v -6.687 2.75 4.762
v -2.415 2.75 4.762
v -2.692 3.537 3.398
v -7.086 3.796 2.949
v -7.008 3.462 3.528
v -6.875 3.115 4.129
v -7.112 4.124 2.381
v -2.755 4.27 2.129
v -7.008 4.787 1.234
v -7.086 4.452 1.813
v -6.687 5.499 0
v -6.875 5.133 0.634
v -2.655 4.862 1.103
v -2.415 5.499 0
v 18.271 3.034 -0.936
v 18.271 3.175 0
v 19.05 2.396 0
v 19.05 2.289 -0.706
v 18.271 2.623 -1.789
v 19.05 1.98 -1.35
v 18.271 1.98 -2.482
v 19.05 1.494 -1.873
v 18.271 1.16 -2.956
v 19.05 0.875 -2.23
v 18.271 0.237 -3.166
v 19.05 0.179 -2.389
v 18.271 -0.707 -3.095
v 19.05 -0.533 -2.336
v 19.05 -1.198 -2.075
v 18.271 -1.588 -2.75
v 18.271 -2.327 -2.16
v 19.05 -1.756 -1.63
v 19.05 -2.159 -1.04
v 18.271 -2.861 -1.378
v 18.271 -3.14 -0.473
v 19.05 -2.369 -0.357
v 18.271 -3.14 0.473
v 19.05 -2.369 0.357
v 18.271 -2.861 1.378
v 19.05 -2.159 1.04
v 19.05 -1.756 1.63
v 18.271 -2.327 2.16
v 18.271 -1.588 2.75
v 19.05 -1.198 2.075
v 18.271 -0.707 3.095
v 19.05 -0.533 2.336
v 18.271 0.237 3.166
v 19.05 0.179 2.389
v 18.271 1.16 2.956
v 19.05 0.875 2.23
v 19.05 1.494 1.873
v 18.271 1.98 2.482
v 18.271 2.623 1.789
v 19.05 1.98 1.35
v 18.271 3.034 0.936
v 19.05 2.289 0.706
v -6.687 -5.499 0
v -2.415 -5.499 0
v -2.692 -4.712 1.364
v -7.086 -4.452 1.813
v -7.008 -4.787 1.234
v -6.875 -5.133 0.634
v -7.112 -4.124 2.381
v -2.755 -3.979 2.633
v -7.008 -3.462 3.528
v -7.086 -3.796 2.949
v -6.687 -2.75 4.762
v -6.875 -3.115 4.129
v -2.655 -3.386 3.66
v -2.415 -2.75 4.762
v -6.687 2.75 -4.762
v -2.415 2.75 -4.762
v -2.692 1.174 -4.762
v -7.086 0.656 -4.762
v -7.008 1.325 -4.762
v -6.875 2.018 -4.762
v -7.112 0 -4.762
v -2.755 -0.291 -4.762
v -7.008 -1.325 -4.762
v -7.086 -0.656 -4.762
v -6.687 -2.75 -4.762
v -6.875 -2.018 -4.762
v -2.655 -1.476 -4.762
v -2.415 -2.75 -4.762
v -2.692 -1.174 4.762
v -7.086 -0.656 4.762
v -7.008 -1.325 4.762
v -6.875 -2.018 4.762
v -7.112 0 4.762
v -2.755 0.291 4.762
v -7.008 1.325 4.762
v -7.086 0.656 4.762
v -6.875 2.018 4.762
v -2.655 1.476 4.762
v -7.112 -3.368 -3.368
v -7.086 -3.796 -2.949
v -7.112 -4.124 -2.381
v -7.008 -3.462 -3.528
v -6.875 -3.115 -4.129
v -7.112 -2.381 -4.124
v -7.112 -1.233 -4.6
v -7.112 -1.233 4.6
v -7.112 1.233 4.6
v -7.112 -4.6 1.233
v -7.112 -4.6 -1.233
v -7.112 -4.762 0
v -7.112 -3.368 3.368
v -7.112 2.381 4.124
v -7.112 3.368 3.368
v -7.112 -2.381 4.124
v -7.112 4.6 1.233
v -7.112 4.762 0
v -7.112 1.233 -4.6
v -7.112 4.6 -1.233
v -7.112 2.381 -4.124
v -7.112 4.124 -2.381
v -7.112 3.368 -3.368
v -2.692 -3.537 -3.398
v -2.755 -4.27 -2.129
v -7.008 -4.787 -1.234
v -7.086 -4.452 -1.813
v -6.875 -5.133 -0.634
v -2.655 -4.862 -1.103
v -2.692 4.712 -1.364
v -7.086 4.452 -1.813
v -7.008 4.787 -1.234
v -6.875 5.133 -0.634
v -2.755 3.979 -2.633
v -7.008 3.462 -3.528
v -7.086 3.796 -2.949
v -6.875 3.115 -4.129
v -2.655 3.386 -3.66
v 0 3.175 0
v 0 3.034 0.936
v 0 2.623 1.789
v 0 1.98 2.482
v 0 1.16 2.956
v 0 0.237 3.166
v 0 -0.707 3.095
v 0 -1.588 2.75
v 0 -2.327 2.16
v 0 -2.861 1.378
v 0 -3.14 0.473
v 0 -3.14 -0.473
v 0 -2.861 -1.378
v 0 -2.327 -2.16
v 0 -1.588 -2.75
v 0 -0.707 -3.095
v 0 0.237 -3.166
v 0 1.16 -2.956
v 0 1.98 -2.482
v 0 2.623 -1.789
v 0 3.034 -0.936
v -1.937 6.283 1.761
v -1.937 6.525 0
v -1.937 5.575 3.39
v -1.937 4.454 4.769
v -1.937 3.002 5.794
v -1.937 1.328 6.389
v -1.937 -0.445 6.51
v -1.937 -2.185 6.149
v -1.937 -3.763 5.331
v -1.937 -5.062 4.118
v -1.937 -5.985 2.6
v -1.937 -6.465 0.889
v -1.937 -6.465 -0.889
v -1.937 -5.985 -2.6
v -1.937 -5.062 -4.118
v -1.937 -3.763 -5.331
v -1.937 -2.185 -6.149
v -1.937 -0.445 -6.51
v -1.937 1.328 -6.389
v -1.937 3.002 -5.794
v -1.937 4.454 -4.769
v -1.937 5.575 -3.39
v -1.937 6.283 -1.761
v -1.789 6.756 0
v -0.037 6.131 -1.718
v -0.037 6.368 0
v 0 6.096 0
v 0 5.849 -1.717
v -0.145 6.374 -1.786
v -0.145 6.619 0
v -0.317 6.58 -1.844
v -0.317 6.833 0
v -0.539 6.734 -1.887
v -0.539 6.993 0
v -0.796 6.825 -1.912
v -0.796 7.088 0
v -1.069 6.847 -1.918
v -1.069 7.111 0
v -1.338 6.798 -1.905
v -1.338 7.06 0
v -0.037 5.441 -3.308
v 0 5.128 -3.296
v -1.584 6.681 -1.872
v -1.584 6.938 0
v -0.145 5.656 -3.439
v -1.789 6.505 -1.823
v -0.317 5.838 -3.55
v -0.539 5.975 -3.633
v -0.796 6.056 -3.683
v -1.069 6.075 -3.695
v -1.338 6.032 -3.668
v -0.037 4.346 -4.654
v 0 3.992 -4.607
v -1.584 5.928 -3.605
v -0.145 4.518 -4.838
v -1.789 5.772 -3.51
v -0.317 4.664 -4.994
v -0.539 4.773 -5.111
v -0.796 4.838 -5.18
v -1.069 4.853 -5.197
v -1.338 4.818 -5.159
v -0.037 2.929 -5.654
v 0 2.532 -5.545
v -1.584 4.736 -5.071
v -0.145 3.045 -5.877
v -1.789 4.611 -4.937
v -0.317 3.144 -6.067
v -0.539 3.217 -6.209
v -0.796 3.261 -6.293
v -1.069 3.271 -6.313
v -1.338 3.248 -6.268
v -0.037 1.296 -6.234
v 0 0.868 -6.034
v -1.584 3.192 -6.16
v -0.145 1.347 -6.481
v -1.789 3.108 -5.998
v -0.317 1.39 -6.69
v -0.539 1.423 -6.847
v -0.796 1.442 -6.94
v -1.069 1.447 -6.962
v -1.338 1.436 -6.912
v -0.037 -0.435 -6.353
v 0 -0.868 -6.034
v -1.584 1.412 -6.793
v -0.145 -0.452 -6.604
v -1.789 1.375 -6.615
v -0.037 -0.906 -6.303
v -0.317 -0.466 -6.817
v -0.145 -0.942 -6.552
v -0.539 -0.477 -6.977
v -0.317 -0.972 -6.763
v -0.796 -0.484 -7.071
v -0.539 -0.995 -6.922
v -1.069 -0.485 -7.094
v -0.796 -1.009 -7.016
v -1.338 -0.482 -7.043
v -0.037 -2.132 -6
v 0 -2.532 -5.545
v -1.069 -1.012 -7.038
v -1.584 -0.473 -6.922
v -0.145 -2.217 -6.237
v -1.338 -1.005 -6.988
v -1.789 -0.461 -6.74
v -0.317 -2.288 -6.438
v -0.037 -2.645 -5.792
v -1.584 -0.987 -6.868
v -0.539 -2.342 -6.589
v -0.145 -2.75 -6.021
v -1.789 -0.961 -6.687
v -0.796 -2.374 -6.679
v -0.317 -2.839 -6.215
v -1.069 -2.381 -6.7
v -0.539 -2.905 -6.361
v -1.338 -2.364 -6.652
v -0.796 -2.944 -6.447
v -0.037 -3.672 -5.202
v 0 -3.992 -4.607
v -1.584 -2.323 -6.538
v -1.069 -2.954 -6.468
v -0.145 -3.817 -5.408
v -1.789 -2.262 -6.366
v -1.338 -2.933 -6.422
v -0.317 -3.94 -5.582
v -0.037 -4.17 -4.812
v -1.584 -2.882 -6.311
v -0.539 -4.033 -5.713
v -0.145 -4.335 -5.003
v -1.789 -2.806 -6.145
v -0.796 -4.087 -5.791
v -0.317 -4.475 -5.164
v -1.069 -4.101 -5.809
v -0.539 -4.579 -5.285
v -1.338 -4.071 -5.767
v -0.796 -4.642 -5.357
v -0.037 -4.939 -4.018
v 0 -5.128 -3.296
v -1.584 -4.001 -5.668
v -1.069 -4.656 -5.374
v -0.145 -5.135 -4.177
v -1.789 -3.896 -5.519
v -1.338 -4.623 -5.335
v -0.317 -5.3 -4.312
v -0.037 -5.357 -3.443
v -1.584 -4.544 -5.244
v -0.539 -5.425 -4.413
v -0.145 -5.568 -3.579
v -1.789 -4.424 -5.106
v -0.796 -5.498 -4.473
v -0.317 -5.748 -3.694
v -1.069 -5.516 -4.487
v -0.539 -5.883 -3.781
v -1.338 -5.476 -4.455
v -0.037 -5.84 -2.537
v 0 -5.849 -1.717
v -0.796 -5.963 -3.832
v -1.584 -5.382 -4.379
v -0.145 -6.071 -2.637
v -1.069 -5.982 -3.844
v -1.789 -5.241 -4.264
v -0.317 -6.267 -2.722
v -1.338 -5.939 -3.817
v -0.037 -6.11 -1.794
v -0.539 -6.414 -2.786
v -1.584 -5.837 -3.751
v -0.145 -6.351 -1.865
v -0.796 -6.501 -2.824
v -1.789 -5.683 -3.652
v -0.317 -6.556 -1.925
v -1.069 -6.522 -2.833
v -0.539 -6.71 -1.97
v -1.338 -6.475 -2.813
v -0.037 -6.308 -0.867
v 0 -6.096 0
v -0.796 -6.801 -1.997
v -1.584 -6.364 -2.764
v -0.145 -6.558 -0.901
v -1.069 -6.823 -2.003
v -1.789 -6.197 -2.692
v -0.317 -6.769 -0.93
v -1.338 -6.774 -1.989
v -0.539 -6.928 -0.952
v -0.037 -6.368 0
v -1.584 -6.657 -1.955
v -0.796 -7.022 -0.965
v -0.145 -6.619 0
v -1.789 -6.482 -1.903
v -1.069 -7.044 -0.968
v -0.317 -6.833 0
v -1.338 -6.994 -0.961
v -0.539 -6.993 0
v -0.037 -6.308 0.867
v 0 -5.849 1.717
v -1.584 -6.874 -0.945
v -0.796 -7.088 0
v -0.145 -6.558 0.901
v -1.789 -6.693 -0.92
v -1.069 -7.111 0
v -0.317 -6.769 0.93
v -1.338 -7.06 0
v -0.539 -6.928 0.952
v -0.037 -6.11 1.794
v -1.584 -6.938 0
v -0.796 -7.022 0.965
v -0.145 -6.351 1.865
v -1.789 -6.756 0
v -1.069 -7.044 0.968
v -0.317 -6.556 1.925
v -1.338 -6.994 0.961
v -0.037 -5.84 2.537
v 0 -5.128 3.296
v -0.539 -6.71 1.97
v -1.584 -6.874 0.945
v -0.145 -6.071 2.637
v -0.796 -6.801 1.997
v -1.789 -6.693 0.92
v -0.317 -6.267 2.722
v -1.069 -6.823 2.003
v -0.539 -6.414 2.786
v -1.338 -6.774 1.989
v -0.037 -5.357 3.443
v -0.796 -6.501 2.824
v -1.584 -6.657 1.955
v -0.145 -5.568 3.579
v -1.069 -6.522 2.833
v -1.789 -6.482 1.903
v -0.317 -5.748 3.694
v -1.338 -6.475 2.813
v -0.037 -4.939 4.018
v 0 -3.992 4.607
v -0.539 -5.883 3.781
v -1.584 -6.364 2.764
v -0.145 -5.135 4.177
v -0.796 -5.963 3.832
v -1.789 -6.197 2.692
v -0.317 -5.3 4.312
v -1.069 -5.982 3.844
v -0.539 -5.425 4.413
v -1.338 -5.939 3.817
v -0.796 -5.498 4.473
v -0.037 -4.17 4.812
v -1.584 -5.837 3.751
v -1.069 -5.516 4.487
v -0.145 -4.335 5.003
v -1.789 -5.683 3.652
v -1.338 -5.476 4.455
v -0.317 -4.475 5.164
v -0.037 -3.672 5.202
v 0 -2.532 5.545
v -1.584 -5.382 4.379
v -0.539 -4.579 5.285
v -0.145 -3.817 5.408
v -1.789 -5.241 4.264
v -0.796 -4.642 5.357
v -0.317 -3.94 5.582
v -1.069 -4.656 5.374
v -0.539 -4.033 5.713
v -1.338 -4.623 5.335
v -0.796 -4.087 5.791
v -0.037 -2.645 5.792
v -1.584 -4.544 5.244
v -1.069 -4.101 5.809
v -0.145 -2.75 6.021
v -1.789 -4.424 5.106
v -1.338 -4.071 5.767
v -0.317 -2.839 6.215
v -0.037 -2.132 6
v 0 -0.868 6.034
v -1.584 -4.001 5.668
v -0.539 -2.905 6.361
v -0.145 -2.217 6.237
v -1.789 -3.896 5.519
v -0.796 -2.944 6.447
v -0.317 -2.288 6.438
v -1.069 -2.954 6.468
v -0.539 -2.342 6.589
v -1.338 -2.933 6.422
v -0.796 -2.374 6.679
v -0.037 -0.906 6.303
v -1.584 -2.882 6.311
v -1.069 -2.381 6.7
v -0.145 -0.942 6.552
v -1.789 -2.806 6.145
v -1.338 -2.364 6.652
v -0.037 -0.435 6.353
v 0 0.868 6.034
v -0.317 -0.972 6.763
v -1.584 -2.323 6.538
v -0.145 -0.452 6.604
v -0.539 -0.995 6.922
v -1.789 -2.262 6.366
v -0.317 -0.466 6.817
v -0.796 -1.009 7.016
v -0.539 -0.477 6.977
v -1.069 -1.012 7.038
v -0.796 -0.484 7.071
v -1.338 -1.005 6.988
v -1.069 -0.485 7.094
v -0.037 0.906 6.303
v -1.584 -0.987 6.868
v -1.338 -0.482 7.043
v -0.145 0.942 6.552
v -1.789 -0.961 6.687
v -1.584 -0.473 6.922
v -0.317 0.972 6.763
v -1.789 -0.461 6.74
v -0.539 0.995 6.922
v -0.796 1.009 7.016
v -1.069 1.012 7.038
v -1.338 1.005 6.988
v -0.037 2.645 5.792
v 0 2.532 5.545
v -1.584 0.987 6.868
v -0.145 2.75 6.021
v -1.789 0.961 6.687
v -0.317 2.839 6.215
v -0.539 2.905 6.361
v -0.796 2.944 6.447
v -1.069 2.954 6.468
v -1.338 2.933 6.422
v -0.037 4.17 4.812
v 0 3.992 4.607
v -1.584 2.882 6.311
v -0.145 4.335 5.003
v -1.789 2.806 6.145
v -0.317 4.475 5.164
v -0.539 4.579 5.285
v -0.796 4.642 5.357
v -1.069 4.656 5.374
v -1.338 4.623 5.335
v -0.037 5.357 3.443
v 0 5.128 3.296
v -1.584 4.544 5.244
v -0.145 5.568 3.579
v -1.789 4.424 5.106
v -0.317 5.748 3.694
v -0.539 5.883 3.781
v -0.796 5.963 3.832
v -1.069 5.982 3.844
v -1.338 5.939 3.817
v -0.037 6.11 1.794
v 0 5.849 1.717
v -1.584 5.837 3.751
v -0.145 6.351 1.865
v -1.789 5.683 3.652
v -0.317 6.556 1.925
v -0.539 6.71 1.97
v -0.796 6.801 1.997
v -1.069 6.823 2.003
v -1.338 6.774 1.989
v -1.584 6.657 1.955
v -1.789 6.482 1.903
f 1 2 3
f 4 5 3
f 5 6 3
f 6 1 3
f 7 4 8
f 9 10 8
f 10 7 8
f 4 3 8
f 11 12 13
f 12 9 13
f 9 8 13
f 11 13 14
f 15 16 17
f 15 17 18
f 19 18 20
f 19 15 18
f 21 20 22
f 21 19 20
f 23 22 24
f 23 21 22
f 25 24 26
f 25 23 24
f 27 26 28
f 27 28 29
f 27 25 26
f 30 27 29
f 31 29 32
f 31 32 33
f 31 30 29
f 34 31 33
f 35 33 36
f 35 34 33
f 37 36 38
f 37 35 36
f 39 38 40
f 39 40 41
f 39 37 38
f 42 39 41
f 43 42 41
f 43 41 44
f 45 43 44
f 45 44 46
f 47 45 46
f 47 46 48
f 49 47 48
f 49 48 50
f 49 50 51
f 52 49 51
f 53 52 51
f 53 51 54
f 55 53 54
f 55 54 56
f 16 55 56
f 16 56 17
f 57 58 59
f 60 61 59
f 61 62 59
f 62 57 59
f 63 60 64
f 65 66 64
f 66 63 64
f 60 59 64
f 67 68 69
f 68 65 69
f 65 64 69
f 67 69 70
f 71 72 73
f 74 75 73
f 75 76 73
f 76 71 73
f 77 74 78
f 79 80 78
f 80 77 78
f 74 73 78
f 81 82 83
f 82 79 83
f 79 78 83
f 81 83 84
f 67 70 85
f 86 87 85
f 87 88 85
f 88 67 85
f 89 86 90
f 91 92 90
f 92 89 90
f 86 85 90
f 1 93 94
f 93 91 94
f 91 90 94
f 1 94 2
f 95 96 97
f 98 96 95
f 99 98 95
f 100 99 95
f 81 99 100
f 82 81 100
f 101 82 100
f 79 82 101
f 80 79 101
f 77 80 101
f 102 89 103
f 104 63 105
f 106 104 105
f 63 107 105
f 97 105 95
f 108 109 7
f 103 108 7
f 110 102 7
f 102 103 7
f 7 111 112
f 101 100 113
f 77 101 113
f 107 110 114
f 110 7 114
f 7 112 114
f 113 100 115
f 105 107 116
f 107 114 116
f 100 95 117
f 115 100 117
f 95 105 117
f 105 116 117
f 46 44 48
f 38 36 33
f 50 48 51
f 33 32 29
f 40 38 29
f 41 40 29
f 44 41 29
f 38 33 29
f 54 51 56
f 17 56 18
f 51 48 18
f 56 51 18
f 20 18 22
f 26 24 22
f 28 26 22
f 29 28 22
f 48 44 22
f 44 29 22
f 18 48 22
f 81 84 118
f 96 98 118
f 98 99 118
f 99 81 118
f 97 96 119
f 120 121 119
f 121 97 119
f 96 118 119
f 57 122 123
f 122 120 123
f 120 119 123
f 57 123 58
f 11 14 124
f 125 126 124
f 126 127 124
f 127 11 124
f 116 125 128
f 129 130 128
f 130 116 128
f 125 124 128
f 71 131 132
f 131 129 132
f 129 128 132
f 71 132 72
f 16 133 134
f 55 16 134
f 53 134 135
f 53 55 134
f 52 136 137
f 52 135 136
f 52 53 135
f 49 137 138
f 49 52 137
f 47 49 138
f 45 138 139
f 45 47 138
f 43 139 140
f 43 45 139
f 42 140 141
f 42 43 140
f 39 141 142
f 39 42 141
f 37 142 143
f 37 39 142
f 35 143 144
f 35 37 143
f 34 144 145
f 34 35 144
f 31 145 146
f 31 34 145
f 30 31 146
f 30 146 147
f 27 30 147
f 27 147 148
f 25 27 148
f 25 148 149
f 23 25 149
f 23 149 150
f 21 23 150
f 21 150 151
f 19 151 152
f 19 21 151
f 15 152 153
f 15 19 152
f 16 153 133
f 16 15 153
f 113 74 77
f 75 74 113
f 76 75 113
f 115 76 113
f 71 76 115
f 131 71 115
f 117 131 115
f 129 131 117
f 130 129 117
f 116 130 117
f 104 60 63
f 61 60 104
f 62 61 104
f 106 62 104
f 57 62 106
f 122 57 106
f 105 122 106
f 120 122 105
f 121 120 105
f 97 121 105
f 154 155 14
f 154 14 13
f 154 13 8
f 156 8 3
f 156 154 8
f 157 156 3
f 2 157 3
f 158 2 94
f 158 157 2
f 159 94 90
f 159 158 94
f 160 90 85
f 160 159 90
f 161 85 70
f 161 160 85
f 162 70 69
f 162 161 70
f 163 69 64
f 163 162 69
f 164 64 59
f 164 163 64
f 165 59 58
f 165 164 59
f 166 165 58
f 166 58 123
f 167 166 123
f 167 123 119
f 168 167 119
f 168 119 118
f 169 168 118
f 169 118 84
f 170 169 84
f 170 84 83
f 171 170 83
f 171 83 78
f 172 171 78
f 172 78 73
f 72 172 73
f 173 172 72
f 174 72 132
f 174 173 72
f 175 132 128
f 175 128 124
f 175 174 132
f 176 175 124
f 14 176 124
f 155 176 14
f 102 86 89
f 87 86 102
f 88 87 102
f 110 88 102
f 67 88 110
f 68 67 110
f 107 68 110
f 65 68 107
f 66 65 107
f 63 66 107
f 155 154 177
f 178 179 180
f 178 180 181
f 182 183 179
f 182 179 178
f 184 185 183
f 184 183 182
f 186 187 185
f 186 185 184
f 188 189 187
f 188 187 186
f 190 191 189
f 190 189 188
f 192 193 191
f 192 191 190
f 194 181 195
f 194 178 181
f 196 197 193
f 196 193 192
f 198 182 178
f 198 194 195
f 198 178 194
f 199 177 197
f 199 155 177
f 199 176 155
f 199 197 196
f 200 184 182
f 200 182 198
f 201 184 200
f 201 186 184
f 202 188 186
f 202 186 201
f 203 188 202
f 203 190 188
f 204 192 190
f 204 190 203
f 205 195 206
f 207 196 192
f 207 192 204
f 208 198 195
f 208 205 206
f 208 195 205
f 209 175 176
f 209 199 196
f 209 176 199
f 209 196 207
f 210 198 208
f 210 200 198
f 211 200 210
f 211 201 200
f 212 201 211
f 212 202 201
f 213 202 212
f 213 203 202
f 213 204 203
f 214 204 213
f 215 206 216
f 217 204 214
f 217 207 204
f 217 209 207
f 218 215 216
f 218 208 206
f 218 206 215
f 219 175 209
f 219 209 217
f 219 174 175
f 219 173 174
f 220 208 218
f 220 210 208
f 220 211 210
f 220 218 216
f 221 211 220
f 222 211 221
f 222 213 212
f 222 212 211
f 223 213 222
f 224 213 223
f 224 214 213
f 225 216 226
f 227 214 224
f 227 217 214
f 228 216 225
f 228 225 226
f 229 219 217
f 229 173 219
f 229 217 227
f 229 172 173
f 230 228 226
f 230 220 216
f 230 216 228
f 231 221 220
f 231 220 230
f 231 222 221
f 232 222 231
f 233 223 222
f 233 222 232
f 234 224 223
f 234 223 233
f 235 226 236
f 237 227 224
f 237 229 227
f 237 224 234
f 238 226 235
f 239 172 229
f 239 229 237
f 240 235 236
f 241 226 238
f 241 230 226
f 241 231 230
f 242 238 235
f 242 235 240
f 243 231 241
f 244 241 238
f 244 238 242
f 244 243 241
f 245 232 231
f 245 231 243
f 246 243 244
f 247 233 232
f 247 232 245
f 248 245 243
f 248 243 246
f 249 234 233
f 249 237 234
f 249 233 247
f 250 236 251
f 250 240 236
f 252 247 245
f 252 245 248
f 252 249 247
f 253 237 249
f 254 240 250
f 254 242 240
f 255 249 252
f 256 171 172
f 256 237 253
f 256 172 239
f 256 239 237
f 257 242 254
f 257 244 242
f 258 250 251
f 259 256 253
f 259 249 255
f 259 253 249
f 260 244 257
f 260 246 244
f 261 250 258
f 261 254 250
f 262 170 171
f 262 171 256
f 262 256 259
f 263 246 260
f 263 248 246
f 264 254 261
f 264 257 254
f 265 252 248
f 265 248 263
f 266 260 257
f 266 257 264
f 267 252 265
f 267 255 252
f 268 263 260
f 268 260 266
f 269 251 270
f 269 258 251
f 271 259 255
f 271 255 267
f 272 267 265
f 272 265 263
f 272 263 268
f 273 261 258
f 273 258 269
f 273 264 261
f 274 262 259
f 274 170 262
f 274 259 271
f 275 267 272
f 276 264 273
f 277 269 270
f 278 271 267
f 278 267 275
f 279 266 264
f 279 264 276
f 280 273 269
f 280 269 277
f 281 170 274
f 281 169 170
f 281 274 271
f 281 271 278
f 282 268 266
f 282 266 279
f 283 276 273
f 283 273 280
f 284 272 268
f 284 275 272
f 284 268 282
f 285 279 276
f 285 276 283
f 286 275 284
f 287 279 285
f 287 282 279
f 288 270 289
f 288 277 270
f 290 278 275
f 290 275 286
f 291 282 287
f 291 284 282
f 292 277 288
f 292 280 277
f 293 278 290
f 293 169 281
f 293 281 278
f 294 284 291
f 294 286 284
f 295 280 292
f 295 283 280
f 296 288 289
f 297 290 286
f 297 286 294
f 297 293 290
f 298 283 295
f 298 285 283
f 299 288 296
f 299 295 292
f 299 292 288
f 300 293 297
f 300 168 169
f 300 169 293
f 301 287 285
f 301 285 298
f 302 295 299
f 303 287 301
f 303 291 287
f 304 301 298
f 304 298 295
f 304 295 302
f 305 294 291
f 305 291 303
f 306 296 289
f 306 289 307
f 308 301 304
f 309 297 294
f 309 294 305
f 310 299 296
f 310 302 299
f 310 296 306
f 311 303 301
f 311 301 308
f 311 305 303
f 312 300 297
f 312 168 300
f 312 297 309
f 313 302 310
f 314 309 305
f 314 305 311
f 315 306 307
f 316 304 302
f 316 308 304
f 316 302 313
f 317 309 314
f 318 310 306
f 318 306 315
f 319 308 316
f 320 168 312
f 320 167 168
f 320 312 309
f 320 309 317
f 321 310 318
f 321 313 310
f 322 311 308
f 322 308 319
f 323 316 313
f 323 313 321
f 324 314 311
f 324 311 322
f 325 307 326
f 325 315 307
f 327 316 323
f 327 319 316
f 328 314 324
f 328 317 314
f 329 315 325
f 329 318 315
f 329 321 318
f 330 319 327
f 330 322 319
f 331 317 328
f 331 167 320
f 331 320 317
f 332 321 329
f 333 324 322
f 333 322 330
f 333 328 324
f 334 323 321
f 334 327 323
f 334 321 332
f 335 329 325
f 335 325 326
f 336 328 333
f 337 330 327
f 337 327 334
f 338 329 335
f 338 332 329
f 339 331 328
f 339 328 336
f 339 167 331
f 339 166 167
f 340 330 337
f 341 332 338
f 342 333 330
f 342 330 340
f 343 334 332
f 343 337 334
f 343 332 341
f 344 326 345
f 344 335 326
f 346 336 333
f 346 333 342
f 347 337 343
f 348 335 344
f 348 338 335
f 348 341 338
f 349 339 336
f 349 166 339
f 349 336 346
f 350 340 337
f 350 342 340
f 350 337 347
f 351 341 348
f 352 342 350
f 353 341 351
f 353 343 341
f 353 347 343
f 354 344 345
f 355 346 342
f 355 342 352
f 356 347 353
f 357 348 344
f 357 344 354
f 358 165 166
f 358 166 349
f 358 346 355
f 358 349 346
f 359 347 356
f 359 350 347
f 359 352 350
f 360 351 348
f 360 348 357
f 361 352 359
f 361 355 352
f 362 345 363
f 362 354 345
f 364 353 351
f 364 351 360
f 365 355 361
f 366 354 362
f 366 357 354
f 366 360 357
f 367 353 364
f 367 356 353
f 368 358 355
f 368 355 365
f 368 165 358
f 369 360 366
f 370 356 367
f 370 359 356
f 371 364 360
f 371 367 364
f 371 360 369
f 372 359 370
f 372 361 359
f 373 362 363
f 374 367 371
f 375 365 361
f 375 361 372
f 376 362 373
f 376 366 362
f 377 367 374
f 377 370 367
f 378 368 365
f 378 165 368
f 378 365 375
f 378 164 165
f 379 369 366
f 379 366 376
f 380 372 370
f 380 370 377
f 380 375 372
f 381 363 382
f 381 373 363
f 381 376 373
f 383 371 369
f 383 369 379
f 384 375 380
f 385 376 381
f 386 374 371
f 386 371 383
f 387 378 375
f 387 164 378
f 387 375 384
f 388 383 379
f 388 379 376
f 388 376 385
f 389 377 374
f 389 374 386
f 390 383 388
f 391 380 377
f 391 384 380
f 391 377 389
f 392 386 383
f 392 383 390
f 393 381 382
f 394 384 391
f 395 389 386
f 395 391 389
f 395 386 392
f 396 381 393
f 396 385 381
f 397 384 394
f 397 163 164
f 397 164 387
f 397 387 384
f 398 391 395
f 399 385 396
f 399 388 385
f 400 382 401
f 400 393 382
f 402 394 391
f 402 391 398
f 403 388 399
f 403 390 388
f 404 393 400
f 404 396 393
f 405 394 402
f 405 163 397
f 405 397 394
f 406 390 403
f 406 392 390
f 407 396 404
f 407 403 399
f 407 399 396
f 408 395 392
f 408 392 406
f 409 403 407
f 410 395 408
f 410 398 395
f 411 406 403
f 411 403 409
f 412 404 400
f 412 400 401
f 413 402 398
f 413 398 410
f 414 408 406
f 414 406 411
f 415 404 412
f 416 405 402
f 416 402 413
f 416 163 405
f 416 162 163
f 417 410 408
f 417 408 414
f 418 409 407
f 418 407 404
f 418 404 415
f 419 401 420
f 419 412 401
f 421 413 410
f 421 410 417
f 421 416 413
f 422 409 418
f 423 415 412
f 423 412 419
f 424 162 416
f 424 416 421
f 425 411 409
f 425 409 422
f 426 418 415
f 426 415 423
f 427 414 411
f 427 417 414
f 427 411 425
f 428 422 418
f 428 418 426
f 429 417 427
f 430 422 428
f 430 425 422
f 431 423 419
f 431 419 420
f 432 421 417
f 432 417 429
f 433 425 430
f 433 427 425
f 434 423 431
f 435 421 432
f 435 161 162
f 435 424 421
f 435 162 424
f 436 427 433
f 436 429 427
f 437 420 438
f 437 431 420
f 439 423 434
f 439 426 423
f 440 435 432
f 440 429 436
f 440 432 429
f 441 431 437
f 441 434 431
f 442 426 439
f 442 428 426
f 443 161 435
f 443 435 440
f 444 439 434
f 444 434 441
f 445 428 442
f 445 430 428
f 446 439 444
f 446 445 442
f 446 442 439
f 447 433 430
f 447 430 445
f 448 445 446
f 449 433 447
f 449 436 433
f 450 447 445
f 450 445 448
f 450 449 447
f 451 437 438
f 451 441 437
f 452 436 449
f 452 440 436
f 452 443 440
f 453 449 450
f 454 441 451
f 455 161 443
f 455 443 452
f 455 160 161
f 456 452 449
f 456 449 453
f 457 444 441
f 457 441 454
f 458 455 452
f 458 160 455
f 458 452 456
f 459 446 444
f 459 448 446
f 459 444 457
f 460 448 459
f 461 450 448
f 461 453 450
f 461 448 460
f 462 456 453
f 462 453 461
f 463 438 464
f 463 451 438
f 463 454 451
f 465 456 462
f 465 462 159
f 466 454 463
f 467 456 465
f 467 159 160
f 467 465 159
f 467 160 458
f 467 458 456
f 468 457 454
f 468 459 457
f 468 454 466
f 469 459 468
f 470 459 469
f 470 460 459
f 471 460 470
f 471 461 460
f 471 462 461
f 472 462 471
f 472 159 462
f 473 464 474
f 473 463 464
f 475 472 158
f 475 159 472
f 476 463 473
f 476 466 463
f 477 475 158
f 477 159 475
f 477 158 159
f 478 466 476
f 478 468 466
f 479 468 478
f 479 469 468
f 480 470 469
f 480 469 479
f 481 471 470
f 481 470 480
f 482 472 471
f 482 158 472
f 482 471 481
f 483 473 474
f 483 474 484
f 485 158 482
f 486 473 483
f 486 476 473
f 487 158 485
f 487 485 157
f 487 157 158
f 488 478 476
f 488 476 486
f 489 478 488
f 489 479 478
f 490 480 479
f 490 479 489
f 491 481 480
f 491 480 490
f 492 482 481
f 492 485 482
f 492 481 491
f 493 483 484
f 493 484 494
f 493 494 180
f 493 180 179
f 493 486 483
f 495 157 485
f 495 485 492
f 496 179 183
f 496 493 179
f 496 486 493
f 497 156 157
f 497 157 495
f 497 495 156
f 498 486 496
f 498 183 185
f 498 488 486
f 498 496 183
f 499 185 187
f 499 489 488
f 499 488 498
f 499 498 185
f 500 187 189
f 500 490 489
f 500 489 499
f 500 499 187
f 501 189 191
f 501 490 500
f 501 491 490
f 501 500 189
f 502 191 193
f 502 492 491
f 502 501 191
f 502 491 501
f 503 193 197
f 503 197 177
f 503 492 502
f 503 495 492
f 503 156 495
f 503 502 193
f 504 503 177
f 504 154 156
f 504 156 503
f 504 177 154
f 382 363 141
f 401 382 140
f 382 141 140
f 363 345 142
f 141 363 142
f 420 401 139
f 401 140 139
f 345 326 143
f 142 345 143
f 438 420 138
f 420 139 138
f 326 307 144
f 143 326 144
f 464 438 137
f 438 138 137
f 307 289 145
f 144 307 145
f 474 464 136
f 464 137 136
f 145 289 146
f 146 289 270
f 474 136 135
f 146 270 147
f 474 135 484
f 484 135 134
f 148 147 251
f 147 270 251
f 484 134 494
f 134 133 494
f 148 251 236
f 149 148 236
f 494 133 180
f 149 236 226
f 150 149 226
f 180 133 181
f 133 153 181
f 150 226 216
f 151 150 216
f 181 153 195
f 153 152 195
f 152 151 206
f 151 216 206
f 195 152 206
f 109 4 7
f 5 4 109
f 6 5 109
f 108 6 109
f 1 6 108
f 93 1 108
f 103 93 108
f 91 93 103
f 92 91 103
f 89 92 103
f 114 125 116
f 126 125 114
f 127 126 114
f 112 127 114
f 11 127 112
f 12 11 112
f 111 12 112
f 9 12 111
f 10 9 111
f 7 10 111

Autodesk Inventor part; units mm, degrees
ref_plane "YZ Plane" through (0, 0, 0) normal (1, 0, 0) x (0, 1, 0)
ref_plane "XZ Plane" through (0, 0, 0) normal (0, 1, 0) x (-1, 0, 0)
sketch "Sketch1" plane through (0, 0, 0) normal (0, 0, 1) x (1, 0, 0)
  line L0 (-3.2004, 0) -> (-3.2004, 3.8156)
  line L1 (0, 6.096) -> (0, 3.175)
  line L2 (4.1148, 3.175) -> (19.05, 3.175)
  line L3 (19.05, 3.175) -> (19.05, 0)
  line L4 (19.05, 0) -> (-3.2004, 0)
  arc A0 (0, 6.096) -> (-1.9368, 6.5254) centre (-1.016, 6.096) ccw
  line L5 (0, -1.4605) -> (0, 8.7631) projected
  line L6 (-7.6505, 0) -> (23.5001, 0) projected
  line L7 (0, 3.175) -> (0.0001, 3.175)
  line L8 (0.0001, 3.175) -> (0.0001, 3.175)
  line L9 (0.0001, 3.175) -> (2.2098, 3.175)
  line L10 (2.2098, 3.175) -> (4.1148, 3.175)
  line L11 (-3.2004, 3.8156) -> (-1.9368, 6.5254)
  line L12 (0.0001, 3.175) -> (4.1148, 3.175) construction
  line L13 (4.1148, 3.175) -> (4.1148, 0) construction
  dimension "d0" = 1.016
  dimension "d1" = 19.05
  dimension "d2" = 14.9352
  dimension "d3" = 14.224
  dimension "d4" = 6.35
  dimension "d5" = 3.2004
  dimension "d15" = 6.35
  dimension "d16" = 6.35
  dimension "d17" = 0.0001
  dimension "d18" = 1.905
  dimension "d19" = 25
revolve "Body" add sketch "Sketch1" angle 360 about axis through (19.05, 0, 0) along (-1, 0, 0)
sketch "Sketch2" plane through (0, 0, 0) normal (1, 0, 0) x (0, 0, -1)
  line L0 (4.7625, 2.7496) -> (4.7625, -2.7496)
  line L1 (4.7625, -2.7496) -> (0, -5.4993)
  line L2 (0, -5.4993) -> (-4.7625, -2.7496)
  line L3 (-4.7625, -2.7496) -> (-4.7625, 2.7496)
  line L4 (-4.7625, 2.7496) -> (0, 5.4993)
  line L5 (0, 5.4993) -> (4.7625, 2.7496)
  point P0 (0, 0)
  point P1 (0, 0)
  dimension "d23" = 9.525
extrude "Head" add sketch "Sketch2" against normal blind 7.112
sketch "Sketch3" plane through (0, 0, 0) normal (0, 0, 1) x (1, 0, 0)
  line L0 (-7.112, 4.7625) -> (-7.112, 5.4993)
  line L1 (-7.112, 5.4993) -> (-6.6866, 5.4993)
  line L2 (-6.6866, 5.4993) -> (-7.112, 4.7625)
  line L3 (-8.0513, 0) -> (-1.476, 0) projected
  line L4 (-7.112, 5.4993) -> (-7.112, 2.7496) projected
  line L5 (-2.4153, 5.4993) -> (-7.112, 5.4993) projected
  point P0 (-7.112, 2.7496)
  dimension "d8" = 30
  dimension "d22" = 9.525
revolve "Chamfer1" cut sketch "Sketch3" angle 360 about axis through (-10, 0, 0) along (1, 0, 0)
thread "Thread" size "1/4-20 UNC" class "2A" standard "ANSI Unified Screw Threads" length 14.9352
chamfer "Chamfer2" distance 0.7791 distance2 0.7791 1 edges at (19.05, -3.175, 0) measured on face at (19.05, -0.6414, -1.6914)
ref_plane "Work Plane1" through (10.95, 0, 0) normal (0, 0, -1) x (1, 0, 0)
equation "\"d0\" = PHH"
equation "\"d1\" = NLG"
equation "\"d2\" = GEL"
equation "\"d3\" = LADI"
equation "\"d4\" = GD"
equation "\"d5\" = 0.45 * KOH"
equation "\"d15\" = SD2"
equation "\"d16\" = BDM"
equation "\"d18\" = GAL"
equation "\"d19\" = KEWI"
equation "\"d23\" = SW"
equation "\"d6\" = KOH"
equation "\"d8\" = ANG1"
equation "\"d22\" = SW0"
equation "\"d10\" = GEL"
equation "\"d13\" = -0.5 * SPD + 0.5 * GD"
equation "\"d14\" = GUL"
equation "\"NLG\" = 19.05"
equation "\"GD\" = NND"
equation "\"BDM\" = NND"
equation "\"KOH\" = 7.112"
equation "\"GEL\" = 14.9352"
equation "\"LADI\" = 14.224"
equation "\"SW\" = 9.525"
equation "\"PHH\" = 1.016"
equation "\"SW0\" = SW"
equation "\"SPD\" = 4.79184"
equation "\"SD2\" = NND"
equation "\"SD\" = 0"
equation "\"ANG1\" = 30deg"
equation "\"KEWI\" = 25deg"
equation "\"GAL\" = 1.905"
equation "\"GUL\" = 0.77908"
equation "\"THREADDIA\" = 6.35"
equation "\"SDH\" = SW"
equation "\"TOA\" = 30deg"
equation "\"NND\" = 6.35"
equation "\"E0\" = 1.155 * SW"
equation "\"GD1\" = 4.79184"
properties part number "am-1271" material "Steel, Mild"
